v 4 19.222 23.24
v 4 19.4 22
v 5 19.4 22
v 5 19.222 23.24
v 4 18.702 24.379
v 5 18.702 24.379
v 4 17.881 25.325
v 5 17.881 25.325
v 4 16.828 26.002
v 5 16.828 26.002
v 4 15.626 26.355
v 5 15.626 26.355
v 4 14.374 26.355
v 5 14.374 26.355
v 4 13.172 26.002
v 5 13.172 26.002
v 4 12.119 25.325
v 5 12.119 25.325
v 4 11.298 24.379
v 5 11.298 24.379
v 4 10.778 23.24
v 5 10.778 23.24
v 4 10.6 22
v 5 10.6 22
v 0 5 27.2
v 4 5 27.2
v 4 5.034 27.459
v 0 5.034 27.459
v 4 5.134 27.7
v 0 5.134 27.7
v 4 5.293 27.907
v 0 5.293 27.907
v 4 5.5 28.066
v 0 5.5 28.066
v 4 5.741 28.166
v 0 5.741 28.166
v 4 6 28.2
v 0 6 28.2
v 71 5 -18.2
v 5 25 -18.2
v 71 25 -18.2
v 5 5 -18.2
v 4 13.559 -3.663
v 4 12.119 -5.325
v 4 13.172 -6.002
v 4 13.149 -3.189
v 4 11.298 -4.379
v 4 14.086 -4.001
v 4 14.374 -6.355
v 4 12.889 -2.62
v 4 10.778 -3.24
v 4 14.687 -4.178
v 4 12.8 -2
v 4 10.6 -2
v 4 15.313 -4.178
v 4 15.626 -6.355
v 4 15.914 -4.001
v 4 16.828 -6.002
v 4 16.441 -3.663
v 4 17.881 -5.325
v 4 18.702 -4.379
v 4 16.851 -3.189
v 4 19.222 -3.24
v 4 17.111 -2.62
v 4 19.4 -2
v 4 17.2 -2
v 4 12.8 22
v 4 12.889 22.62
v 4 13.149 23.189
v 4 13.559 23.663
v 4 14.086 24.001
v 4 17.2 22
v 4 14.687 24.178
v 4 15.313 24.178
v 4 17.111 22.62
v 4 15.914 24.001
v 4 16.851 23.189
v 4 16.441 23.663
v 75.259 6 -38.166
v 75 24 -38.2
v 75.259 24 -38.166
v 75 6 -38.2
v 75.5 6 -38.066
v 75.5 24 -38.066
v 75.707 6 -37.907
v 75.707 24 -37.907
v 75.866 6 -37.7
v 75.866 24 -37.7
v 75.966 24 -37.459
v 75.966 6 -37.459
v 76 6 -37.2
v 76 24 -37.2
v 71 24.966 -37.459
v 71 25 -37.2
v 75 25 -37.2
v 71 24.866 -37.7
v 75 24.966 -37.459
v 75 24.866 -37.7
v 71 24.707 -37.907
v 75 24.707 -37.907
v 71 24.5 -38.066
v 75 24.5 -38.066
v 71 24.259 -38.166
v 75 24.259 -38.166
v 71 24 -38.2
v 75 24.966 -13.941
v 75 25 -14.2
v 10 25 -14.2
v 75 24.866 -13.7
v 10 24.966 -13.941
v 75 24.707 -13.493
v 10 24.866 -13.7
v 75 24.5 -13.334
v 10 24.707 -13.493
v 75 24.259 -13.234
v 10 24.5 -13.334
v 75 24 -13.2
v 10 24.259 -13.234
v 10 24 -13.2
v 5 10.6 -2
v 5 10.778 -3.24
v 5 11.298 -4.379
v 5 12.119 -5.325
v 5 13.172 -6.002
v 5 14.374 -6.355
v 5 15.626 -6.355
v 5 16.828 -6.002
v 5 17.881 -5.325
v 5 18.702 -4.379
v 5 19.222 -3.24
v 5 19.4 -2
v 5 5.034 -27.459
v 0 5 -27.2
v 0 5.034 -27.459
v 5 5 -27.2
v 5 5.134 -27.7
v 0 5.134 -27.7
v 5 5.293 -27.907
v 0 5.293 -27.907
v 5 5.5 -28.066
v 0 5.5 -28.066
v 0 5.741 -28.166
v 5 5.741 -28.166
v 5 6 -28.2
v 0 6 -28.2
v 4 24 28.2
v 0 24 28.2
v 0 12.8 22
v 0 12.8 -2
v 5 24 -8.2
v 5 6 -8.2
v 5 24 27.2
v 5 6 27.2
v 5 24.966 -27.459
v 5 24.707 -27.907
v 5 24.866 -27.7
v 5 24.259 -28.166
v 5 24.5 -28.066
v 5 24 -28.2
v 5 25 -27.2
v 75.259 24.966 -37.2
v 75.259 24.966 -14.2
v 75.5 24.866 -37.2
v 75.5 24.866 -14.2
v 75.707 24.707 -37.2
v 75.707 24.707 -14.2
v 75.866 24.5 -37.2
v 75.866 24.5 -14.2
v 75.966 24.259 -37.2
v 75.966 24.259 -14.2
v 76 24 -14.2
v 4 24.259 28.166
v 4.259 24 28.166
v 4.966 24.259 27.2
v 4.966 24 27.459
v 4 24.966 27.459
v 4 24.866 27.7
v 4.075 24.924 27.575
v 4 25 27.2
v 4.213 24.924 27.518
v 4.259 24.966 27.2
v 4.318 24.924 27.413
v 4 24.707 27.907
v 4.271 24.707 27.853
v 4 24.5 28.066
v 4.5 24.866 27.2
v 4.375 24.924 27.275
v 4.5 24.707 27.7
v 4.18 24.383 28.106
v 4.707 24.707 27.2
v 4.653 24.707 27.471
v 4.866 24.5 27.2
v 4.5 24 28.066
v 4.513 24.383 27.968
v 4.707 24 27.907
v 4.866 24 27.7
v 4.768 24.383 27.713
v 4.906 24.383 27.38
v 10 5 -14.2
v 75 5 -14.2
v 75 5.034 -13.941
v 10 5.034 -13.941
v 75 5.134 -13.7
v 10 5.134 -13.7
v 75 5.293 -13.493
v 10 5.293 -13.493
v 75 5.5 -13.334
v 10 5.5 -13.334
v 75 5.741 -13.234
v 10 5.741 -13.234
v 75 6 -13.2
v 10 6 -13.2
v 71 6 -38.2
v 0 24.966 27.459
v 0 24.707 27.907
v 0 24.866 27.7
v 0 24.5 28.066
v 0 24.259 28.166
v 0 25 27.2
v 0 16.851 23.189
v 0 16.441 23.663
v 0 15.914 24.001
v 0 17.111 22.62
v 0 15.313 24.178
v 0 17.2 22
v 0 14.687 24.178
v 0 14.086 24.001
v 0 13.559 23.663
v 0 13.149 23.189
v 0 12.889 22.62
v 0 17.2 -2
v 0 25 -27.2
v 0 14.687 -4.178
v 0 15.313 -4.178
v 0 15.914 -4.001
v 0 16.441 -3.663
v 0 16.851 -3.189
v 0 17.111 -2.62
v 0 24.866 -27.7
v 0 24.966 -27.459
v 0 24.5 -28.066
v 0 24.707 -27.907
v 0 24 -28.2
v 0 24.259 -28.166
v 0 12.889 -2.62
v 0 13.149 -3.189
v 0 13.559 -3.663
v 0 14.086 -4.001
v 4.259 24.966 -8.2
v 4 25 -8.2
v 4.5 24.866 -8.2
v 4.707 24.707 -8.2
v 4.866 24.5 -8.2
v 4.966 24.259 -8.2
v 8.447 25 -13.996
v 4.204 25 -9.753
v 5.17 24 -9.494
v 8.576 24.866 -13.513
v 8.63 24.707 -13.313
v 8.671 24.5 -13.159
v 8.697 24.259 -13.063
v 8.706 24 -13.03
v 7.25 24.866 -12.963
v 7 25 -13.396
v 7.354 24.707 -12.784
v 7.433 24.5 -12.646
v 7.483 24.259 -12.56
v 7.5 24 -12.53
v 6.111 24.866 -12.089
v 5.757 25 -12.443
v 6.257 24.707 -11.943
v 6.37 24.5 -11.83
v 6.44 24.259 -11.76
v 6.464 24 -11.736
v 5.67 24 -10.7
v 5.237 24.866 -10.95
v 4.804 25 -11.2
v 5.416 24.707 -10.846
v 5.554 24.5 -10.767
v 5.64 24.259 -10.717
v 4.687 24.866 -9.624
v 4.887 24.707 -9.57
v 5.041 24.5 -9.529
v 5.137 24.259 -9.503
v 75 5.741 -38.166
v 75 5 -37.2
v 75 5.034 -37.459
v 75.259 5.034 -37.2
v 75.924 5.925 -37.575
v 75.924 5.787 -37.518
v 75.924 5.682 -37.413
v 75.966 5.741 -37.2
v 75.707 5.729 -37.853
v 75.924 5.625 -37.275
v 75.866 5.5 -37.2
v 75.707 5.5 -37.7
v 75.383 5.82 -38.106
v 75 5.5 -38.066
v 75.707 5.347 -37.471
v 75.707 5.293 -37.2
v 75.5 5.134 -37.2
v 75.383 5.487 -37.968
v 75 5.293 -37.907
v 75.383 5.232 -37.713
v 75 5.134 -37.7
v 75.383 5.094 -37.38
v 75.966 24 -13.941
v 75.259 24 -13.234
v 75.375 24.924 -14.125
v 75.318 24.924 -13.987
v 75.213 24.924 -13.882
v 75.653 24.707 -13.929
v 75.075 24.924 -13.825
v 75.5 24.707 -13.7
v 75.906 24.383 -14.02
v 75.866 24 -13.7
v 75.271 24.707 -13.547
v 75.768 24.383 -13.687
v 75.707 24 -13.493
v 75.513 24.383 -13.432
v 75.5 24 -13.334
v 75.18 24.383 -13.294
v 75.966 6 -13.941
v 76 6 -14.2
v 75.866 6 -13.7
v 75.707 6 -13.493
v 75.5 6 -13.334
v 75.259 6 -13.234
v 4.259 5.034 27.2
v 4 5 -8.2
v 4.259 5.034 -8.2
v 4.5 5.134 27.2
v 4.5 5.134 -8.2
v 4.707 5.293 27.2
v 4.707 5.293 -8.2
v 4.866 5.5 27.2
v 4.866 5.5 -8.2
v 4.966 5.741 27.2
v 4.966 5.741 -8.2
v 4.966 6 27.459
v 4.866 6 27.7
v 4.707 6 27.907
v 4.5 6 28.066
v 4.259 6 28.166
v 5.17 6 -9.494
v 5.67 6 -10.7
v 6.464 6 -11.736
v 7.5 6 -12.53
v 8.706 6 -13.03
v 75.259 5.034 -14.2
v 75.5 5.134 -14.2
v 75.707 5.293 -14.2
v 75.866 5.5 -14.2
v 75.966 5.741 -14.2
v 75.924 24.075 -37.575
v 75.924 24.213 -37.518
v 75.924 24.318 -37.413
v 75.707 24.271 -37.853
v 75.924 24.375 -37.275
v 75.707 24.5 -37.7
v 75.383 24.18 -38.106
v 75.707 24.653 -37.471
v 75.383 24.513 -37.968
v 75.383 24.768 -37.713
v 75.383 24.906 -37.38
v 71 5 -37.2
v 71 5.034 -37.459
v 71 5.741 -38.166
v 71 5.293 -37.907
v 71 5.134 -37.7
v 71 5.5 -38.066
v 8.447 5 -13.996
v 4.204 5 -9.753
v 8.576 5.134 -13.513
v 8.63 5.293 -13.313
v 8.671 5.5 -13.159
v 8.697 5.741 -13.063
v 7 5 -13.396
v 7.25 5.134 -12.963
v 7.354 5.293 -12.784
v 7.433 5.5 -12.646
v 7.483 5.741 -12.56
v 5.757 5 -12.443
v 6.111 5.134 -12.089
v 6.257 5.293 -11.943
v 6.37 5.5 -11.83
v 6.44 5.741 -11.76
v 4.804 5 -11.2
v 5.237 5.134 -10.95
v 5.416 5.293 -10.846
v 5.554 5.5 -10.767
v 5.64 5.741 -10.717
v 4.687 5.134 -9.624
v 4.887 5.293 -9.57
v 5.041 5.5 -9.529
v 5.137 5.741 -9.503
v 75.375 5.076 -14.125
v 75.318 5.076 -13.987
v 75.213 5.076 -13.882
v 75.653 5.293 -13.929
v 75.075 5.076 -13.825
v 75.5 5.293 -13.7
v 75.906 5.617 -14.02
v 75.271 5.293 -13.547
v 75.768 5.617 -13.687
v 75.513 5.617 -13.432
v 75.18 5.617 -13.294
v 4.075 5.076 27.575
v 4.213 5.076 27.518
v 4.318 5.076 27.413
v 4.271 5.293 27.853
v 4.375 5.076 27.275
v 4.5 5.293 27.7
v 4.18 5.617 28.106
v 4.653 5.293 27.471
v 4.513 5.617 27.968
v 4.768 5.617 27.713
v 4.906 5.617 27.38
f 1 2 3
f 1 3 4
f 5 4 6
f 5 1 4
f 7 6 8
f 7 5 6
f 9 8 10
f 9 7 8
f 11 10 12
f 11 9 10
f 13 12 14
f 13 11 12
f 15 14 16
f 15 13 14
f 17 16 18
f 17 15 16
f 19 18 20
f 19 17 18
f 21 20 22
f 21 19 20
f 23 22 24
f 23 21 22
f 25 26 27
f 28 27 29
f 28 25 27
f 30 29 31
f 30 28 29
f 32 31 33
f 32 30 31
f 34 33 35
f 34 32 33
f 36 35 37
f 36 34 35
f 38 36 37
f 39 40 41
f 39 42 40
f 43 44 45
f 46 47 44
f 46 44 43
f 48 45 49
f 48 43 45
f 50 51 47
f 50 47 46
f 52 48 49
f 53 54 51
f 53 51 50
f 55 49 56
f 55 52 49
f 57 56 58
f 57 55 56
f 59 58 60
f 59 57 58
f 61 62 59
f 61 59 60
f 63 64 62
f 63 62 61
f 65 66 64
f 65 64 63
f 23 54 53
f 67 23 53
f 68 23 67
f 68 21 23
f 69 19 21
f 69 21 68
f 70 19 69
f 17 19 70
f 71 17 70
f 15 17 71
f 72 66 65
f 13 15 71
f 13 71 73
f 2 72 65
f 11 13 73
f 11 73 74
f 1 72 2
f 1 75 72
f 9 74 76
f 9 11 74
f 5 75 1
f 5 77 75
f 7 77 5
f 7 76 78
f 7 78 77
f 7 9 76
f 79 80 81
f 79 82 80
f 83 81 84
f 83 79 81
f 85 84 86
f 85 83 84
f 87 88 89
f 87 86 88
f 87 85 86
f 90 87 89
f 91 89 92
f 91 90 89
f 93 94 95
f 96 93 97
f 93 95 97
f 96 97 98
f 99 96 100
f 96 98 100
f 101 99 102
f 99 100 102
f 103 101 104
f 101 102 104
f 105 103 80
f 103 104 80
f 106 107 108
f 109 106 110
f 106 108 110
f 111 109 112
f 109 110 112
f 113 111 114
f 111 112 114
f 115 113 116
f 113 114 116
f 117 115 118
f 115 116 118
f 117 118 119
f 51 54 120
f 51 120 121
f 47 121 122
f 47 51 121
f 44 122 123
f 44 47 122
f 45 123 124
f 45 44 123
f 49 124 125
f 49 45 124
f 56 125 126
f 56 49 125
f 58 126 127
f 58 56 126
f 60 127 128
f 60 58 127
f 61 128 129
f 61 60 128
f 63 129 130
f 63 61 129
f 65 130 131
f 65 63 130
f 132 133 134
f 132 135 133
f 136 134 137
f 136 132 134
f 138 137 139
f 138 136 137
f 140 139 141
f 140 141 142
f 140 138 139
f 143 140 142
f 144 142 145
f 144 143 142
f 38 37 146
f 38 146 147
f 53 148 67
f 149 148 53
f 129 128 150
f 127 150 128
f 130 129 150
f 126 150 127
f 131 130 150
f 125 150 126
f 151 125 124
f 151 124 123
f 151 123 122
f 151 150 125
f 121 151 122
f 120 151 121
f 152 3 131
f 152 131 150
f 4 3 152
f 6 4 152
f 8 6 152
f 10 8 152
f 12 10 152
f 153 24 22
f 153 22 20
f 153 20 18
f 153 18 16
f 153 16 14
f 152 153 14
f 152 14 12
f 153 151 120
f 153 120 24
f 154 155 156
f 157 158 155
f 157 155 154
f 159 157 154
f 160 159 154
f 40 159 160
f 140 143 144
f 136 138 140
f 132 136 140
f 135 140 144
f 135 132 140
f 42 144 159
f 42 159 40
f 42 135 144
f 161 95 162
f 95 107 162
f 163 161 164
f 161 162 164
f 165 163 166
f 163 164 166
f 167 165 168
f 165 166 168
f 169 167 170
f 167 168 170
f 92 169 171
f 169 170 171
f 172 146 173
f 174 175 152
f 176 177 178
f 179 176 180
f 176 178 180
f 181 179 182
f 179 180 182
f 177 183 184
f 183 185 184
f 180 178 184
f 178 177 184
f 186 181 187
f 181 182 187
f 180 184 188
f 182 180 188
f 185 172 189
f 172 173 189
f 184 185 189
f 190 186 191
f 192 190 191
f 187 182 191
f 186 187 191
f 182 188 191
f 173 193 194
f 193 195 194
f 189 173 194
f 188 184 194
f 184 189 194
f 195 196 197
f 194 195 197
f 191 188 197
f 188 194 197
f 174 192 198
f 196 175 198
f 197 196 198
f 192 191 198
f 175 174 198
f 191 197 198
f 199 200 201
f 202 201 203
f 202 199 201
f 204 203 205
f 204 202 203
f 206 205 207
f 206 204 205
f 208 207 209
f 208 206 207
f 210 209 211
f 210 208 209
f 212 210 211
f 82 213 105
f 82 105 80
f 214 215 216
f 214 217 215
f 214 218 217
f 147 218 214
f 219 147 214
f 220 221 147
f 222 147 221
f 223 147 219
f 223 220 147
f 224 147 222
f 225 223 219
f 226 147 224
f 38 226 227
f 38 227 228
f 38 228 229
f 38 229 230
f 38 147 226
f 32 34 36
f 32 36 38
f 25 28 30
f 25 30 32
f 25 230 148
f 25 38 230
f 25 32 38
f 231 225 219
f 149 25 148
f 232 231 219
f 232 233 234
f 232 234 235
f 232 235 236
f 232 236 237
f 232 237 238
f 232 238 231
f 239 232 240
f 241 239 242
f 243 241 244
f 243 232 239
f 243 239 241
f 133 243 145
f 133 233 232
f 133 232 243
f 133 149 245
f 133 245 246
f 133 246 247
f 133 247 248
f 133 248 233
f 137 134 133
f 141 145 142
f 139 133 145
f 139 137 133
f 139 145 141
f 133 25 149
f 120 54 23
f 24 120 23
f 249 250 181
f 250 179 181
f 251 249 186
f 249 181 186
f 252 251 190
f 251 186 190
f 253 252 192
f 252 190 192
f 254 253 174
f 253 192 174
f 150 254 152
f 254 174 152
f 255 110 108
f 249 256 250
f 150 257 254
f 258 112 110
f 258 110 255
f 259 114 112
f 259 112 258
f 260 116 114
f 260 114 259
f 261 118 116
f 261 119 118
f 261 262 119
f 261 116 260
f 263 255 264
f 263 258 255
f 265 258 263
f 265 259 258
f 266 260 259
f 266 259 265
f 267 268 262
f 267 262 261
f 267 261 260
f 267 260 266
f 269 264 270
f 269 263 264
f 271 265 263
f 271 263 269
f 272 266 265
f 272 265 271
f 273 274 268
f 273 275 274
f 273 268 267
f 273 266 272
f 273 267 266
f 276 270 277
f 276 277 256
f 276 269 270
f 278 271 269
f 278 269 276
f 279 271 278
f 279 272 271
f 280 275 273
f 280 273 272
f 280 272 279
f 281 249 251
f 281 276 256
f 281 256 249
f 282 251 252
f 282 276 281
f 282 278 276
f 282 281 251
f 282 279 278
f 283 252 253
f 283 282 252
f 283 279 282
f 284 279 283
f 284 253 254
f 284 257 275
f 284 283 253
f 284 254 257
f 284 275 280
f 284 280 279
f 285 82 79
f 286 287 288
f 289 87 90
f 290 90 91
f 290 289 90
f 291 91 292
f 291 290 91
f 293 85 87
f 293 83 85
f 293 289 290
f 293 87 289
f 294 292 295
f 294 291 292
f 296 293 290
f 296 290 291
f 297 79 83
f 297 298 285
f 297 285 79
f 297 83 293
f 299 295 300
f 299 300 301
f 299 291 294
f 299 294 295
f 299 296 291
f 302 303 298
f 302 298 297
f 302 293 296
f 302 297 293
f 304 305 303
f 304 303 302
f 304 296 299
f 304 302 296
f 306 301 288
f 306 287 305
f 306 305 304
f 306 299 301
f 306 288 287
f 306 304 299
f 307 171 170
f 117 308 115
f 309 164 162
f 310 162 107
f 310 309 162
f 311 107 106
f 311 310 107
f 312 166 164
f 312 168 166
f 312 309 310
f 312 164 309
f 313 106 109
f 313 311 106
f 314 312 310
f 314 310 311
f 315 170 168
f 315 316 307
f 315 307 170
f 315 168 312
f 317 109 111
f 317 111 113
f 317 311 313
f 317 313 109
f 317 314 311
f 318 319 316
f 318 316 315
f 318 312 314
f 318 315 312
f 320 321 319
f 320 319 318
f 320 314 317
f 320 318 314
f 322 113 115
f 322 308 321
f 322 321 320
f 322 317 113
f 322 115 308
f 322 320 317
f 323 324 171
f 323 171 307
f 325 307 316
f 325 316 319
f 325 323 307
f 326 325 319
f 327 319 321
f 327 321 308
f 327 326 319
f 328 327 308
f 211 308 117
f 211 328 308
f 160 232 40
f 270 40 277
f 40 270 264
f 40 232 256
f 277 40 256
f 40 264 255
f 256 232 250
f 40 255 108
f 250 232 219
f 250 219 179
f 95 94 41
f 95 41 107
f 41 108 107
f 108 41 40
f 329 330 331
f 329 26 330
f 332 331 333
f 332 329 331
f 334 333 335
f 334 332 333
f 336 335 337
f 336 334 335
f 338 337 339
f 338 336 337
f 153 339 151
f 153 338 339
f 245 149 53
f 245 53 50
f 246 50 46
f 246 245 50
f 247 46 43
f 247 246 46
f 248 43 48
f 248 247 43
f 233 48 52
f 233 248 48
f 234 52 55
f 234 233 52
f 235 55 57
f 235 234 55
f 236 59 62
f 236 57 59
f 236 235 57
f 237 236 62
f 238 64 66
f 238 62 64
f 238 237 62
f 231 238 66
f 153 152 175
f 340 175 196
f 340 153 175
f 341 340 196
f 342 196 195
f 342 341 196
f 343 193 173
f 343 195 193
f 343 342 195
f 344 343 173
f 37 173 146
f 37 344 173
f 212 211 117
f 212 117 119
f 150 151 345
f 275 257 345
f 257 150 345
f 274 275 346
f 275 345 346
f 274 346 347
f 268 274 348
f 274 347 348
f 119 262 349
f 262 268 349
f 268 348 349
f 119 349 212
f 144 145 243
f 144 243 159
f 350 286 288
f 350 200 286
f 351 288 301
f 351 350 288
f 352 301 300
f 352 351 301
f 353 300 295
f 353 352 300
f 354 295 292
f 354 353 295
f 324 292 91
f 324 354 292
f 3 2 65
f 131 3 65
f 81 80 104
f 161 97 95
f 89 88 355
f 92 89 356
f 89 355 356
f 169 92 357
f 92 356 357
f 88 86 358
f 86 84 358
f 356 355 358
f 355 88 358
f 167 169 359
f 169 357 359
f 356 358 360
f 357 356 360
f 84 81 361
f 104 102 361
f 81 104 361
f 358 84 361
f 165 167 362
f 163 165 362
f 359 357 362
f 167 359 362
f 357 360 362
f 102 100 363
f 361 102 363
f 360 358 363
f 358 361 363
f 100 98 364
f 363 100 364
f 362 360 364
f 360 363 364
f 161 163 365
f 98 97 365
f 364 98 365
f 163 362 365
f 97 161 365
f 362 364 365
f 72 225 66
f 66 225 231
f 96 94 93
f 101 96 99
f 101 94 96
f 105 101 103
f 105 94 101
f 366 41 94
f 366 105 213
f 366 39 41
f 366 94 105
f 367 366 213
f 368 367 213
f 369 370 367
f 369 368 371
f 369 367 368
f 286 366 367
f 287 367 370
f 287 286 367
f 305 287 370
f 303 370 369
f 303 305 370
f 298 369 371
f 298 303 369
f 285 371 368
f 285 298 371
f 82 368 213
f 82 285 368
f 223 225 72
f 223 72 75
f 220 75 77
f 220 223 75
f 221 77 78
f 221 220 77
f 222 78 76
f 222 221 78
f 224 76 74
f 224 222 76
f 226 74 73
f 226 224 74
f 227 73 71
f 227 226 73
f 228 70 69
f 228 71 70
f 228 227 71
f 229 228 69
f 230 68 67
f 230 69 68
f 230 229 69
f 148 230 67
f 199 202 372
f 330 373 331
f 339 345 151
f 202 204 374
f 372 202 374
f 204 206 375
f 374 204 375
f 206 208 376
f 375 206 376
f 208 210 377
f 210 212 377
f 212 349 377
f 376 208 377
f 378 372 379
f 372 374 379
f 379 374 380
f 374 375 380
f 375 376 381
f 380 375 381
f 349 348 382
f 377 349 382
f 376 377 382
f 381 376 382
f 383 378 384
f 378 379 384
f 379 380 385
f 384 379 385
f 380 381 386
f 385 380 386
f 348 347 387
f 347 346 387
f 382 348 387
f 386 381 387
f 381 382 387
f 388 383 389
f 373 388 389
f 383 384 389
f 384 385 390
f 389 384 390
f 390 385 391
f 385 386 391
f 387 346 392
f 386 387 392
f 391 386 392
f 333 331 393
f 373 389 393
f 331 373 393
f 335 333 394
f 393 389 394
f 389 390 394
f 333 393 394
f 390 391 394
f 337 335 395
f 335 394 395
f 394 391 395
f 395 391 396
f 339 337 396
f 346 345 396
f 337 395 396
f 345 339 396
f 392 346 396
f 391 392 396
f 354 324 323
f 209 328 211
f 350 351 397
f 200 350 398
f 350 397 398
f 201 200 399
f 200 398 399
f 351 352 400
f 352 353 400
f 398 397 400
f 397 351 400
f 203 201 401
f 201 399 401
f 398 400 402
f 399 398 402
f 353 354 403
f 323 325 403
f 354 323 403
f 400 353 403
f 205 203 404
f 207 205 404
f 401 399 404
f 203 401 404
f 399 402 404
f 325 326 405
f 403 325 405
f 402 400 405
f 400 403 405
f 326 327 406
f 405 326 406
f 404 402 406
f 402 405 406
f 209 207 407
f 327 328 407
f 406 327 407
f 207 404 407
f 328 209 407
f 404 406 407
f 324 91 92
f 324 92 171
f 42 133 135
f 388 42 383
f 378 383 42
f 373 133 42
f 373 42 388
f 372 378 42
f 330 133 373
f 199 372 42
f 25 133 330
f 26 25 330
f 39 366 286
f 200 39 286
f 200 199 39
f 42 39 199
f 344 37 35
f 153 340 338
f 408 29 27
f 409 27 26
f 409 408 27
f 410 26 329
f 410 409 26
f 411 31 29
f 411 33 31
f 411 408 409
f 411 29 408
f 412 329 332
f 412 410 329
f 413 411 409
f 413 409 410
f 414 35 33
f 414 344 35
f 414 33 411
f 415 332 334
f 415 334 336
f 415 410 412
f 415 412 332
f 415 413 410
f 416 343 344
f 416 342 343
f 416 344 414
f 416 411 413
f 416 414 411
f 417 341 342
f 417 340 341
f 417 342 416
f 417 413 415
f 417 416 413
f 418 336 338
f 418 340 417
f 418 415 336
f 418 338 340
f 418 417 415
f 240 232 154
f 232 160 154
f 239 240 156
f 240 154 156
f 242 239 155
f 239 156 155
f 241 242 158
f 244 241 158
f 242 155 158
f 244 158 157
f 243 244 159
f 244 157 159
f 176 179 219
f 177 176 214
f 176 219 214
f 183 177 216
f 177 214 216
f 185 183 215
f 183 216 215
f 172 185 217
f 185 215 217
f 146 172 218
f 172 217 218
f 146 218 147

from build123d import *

# Parameters (mm, degrees)
PAD001_DEPTH    = 10
POCKET002_DEPTH = 76.001
POCKET003_DEPTH = 72.001
FILLET001_R     = 1


with BuildPart() as part:
    # Sketch003 → Pad001 (new body, symmetric)
    with BuildSketch(Plane.XZ):
        with BuildLine():
            Line((5, -18.2), (71, -18.2))
            Line((71, -18.2), (71, -38.2))
            Line((71, -38.2), (76, -38.2))
            Line((76, -38.2), (76, -13.2))
            Line((76, -13.2), (10, -13.2))
            ThreePointArc((5, -8.2), (6.464466, -11.735534), (10, -13.2))
            Line((5, -8.2), (5, 28.2))
            Line((5, 28.2), (0, 28.2))
            Line((0, 28.2), (0, -28.2))
            Line((0, -28.2), (5, -28.2))
            Line((5, -28.2), (5, -18.2))
        make_face()
    extrude(amount=PAD001_DEPTH, both=True)

    # Sketch004 → Pocket002 (cut, through all)
    with BuildSketch(Plane.YZ):
        with BuildLine():
            ThreePointArc((2.2, 22), (0, 24.2), (-2.2, 22))
            Line((-2.2, 22), (-2.2, -2))
            ThreePointArc((-2.2, -2), (0, -4.2), (2.2, -2))
            Line((2.2, 22), (2.2, -2))
        make_face()
    extrude(amount=POCKET002_DEPTH, mode=Mode.SUBTRACT)

    # Sketch005 → Pocket003 (cut, through all)
    with BuildSketch(Plane.YZ.offset(4)):
        with BuildLine():
            ThreePointArc((4.4, 22), (0, 26.4), (-4.4, 22))
            Line((-4.4, -2), (-4.4, 22))
            ThreePointArc((-4.4, -2), (0, -6.4), (4.4, -2))
            Line((4.4, 22), (4.4, -2))
        make_face()
    extrude(amount=POCKET003_DEPTH, mode=Mode.SUBTRACT)

    # Fillet001
    fillet001_edges = [part.edges().sort_by_distance(p)[0] for p in [
        (5, 0, 28.2),
        (2.5, -10, 28.2),
        (2.5, 10, 28.2),
        (2.5, -10, -28.2),
        (2.5, 10, -28.2),
        (73.5, -10, -38.2),
        (73.5, 10, -38.2),
        (76, 0, -38.2),
        (76, 0, -13.2),
        (76, 10, -25.7),
        (76, -10, -25.7),
        (10, 0, -13.2),
        (43, 10, -13.2),
        (43, -10, -13.2),
    ]]
    fillet(fillet001_edges, radius=FILLET001_R)


with BuildPart() as part_1:
    # Body001 placement: moved
    add(part.part.moved(Location((0, 15, 0))))


solid = part_1.part
